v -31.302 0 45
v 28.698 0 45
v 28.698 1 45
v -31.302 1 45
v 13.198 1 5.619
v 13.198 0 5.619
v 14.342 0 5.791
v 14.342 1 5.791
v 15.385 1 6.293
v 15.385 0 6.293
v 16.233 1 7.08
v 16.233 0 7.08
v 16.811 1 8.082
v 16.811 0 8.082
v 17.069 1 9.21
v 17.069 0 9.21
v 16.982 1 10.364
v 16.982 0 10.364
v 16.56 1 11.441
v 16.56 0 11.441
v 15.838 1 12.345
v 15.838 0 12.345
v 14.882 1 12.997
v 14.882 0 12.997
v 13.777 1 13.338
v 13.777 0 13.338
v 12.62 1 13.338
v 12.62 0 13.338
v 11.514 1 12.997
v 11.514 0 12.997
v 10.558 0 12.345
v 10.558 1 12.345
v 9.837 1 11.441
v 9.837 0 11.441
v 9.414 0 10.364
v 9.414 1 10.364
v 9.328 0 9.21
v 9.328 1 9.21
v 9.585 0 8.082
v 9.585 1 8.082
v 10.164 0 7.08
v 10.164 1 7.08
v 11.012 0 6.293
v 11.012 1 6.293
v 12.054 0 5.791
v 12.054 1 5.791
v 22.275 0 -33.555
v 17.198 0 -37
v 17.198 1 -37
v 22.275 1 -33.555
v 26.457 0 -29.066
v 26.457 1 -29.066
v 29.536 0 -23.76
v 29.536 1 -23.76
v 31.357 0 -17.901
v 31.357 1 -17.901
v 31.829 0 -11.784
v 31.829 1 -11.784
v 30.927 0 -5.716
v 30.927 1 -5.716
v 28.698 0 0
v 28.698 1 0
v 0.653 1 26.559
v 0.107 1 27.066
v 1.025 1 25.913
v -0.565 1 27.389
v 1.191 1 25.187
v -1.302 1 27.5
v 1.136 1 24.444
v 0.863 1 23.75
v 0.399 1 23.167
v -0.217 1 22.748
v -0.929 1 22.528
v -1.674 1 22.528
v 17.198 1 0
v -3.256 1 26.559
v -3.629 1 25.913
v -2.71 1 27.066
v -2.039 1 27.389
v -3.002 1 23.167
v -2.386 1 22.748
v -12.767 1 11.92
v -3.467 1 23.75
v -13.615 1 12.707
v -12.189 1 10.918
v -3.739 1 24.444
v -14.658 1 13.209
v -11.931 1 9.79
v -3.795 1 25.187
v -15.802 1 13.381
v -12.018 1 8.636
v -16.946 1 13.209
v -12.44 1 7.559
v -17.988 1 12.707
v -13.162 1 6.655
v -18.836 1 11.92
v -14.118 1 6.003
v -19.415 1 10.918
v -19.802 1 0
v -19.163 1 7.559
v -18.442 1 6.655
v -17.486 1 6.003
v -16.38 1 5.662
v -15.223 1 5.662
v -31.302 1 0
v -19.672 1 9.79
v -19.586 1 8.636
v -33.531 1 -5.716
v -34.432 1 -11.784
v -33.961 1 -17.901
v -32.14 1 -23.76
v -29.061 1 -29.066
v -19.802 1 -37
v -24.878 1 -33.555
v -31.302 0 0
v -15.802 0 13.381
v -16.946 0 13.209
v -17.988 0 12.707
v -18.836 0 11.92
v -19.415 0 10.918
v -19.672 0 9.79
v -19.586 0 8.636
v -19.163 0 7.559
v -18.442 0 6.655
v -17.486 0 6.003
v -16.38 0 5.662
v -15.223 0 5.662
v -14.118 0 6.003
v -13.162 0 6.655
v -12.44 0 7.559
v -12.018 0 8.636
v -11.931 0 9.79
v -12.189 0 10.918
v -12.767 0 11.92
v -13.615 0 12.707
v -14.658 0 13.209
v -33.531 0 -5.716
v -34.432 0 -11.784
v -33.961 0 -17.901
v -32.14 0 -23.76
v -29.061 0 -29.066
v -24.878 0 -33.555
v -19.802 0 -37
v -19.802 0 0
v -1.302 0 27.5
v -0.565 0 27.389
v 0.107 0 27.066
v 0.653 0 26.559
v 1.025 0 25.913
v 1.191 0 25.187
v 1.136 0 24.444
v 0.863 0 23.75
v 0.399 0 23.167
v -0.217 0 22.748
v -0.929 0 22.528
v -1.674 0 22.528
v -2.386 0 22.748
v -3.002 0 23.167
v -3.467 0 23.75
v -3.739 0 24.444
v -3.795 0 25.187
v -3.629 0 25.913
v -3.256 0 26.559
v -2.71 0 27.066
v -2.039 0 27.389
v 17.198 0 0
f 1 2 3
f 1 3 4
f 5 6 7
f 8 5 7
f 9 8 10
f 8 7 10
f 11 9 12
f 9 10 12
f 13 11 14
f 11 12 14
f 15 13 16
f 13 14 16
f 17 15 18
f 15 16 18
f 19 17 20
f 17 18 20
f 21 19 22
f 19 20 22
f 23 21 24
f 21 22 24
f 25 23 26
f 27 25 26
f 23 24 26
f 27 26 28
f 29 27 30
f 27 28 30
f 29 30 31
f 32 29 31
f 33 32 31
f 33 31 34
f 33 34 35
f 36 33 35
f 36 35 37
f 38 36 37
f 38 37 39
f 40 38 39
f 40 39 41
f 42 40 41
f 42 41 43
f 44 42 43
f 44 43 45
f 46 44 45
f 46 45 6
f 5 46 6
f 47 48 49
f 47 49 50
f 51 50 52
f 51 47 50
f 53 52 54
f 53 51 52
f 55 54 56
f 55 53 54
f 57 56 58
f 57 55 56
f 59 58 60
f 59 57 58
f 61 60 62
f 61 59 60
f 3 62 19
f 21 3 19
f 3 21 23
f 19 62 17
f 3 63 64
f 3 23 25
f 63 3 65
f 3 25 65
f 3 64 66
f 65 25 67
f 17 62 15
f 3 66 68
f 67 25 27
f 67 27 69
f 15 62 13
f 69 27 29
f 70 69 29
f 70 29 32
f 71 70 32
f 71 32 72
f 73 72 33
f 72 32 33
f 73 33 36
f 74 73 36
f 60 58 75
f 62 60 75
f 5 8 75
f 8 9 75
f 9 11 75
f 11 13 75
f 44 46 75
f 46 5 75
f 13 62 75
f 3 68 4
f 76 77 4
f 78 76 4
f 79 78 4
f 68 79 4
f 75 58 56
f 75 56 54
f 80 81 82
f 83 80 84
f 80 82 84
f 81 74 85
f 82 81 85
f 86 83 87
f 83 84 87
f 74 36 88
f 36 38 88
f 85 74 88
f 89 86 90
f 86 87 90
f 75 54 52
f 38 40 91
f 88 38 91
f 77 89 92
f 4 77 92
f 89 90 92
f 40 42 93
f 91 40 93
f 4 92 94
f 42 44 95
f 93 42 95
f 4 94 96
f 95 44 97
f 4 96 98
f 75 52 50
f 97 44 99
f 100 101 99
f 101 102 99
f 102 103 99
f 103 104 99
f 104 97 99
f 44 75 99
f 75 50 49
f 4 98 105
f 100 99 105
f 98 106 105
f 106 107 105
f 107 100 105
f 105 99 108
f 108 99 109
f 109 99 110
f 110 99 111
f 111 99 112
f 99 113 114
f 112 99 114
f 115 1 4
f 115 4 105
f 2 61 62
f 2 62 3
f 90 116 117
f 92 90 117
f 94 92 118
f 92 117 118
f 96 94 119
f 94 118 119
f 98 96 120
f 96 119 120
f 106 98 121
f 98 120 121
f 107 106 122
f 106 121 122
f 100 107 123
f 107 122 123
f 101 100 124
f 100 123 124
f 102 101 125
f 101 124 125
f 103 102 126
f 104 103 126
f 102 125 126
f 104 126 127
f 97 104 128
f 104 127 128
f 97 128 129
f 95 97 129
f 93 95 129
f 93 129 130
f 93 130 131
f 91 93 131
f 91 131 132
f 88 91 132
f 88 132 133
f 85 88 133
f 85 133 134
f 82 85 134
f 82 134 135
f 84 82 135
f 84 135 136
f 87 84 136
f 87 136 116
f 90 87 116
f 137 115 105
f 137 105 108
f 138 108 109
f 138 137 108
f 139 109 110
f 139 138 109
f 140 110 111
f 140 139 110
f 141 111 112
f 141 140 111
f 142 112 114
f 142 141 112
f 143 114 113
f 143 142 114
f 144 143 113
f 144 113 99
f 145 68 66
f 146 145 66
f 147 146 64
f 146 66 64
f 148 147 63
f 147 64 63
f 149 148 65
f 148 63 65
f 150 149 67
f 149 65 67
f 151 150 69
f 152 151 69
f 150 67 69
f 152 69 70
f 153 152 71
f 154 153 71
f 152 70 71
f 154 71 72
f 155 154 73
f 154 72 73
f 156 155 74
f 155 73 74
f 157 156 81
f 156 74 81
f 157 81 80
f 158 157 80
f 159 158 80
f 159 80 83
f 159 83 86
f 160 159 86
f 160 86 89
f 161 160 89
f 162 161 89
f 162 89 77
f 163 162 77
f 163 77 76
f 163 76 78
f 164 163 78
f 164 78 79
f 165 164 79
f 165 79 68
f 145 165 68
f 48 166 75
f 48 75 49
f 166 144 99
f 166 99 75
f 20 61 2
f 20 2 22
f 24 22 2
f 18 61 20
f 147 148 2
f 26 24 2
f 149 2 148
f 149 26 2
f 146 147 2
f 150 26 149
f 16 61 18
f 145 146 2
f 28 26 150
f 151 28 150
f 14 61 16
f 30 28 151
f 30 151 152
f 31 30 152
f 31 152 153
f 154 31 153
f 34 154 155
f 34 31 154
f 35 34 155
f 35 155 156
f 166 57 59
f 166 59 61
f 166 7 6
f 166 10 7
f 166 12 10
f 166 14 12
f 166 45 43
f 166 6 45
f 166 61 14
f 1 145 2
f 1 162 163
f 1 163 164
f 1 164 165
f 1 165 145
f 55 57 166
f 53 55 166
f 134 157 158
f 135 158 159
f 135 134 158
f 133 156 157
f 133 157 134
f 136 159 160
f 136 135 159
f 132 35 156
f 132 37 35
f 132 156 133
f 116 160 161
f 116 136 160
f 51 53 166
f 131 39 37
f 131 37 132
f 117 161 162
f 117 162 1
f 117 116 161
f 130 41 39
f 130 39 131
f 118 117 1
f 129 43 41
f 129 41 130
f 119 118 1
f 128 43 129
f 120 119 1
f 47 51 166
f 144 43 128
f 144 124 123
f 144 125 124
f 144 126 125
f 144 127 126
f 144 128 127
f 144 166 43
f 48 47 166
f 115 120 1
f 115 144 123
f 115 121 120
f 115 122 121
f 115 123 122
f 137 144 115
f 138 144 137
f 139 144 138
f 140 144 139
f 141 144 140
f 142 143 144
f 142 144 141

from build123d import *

# Parameters (mm, degrees)
BOSS_EXTRUDE1_DEPTH = 1
SKETCH2_R           = 2.5
CUT_EXTRUDE1_DEPTH  = 20
SKETCH3_W           = 5
SKETCH3_H           = 5
CUT_EXTRUDE2_DEPTH  = 10
SKETCH4_R           = 3.881431072
CUT_EXTRUDE3_DEPTH  = 10


with BuildPart() as part:
    # Sketch1 → Boss-Extrude1 (new body)
    with BuildSketch(Plane(origin=(0, 0, 0), x_dir=(1, 0, 0), z_dir=(0, 1, 0))):
        with BuildLine():
            Line((-19.801702617, 0), (17.198297383, 0))
            Line((17.198297383, 0), (17.198297383, 37))
            ThreePointArc((17.198297383, 37), (30.611248287, 20.881727984), (28.698297383, 0))
            Line((28.698297383, 0), (28.698297383, -45))
            Line((28.698297383, -45), (-31.301702617, -45))
            Line((-31.301702617, -45), (-31.301702617, 0))
            ThreePointArc((-31.301702617, 0), (-33.214653521, 20.881727984), (-19.801702617, 37))
            Line((-19.801702617, 37), (-19.801702617, 0))
        make_face()
    extrude(amount=BOSS_EXTRUDE1_DEPTH)

    # Sketch2 → Cut-Extrude1 (cut)
    with BuildSketch(Plane(origin=(0, 1, 0), x_dir=(1, 0, 0), z_dir=(0, 1, 0))):
        with Locations(Location((-1.301702617, -25, 0), (0, 0, 270))):
            Circle(SKETCH2_R)
    extrude(amount=-CUT_EXTRUDE1_DEPTH, mode=Mode.SUBTRACT)

    # Sketch3 → Cut-Extrude2 (cut)
    with BuildSketch(Plane.XZ):
        with Locations((13.198297383, 9.5)):
            Rectangle(SKETCH3_W, SKETCH3_H)
        with Locations((-15.801702617, 9.5)):
            Rectangle(SKETCH3_W, SKETCH3_H)
    extrude(amount=-CUT_EXTRUDE2_DEPTH, mode=Mode.SUBTRACT)

    # Sketch4 → Cut-Extrude3 (cut)
    with BuildSketch(Plane.XZ):
        with Locations(Location((13.198297383, 9.5, 0), (0, 0, 270))):
            Circle(SKETCH4_R)
        with Locations(Location((-15.801702617, 9.5, 0), (0, 0, 90))):
            Circle(SKETCH4_R)
    extrude(amount=-CUT_EXTRUDE3_DEPTH, mode=Mode.SUBTRACT)


solid = part.part
